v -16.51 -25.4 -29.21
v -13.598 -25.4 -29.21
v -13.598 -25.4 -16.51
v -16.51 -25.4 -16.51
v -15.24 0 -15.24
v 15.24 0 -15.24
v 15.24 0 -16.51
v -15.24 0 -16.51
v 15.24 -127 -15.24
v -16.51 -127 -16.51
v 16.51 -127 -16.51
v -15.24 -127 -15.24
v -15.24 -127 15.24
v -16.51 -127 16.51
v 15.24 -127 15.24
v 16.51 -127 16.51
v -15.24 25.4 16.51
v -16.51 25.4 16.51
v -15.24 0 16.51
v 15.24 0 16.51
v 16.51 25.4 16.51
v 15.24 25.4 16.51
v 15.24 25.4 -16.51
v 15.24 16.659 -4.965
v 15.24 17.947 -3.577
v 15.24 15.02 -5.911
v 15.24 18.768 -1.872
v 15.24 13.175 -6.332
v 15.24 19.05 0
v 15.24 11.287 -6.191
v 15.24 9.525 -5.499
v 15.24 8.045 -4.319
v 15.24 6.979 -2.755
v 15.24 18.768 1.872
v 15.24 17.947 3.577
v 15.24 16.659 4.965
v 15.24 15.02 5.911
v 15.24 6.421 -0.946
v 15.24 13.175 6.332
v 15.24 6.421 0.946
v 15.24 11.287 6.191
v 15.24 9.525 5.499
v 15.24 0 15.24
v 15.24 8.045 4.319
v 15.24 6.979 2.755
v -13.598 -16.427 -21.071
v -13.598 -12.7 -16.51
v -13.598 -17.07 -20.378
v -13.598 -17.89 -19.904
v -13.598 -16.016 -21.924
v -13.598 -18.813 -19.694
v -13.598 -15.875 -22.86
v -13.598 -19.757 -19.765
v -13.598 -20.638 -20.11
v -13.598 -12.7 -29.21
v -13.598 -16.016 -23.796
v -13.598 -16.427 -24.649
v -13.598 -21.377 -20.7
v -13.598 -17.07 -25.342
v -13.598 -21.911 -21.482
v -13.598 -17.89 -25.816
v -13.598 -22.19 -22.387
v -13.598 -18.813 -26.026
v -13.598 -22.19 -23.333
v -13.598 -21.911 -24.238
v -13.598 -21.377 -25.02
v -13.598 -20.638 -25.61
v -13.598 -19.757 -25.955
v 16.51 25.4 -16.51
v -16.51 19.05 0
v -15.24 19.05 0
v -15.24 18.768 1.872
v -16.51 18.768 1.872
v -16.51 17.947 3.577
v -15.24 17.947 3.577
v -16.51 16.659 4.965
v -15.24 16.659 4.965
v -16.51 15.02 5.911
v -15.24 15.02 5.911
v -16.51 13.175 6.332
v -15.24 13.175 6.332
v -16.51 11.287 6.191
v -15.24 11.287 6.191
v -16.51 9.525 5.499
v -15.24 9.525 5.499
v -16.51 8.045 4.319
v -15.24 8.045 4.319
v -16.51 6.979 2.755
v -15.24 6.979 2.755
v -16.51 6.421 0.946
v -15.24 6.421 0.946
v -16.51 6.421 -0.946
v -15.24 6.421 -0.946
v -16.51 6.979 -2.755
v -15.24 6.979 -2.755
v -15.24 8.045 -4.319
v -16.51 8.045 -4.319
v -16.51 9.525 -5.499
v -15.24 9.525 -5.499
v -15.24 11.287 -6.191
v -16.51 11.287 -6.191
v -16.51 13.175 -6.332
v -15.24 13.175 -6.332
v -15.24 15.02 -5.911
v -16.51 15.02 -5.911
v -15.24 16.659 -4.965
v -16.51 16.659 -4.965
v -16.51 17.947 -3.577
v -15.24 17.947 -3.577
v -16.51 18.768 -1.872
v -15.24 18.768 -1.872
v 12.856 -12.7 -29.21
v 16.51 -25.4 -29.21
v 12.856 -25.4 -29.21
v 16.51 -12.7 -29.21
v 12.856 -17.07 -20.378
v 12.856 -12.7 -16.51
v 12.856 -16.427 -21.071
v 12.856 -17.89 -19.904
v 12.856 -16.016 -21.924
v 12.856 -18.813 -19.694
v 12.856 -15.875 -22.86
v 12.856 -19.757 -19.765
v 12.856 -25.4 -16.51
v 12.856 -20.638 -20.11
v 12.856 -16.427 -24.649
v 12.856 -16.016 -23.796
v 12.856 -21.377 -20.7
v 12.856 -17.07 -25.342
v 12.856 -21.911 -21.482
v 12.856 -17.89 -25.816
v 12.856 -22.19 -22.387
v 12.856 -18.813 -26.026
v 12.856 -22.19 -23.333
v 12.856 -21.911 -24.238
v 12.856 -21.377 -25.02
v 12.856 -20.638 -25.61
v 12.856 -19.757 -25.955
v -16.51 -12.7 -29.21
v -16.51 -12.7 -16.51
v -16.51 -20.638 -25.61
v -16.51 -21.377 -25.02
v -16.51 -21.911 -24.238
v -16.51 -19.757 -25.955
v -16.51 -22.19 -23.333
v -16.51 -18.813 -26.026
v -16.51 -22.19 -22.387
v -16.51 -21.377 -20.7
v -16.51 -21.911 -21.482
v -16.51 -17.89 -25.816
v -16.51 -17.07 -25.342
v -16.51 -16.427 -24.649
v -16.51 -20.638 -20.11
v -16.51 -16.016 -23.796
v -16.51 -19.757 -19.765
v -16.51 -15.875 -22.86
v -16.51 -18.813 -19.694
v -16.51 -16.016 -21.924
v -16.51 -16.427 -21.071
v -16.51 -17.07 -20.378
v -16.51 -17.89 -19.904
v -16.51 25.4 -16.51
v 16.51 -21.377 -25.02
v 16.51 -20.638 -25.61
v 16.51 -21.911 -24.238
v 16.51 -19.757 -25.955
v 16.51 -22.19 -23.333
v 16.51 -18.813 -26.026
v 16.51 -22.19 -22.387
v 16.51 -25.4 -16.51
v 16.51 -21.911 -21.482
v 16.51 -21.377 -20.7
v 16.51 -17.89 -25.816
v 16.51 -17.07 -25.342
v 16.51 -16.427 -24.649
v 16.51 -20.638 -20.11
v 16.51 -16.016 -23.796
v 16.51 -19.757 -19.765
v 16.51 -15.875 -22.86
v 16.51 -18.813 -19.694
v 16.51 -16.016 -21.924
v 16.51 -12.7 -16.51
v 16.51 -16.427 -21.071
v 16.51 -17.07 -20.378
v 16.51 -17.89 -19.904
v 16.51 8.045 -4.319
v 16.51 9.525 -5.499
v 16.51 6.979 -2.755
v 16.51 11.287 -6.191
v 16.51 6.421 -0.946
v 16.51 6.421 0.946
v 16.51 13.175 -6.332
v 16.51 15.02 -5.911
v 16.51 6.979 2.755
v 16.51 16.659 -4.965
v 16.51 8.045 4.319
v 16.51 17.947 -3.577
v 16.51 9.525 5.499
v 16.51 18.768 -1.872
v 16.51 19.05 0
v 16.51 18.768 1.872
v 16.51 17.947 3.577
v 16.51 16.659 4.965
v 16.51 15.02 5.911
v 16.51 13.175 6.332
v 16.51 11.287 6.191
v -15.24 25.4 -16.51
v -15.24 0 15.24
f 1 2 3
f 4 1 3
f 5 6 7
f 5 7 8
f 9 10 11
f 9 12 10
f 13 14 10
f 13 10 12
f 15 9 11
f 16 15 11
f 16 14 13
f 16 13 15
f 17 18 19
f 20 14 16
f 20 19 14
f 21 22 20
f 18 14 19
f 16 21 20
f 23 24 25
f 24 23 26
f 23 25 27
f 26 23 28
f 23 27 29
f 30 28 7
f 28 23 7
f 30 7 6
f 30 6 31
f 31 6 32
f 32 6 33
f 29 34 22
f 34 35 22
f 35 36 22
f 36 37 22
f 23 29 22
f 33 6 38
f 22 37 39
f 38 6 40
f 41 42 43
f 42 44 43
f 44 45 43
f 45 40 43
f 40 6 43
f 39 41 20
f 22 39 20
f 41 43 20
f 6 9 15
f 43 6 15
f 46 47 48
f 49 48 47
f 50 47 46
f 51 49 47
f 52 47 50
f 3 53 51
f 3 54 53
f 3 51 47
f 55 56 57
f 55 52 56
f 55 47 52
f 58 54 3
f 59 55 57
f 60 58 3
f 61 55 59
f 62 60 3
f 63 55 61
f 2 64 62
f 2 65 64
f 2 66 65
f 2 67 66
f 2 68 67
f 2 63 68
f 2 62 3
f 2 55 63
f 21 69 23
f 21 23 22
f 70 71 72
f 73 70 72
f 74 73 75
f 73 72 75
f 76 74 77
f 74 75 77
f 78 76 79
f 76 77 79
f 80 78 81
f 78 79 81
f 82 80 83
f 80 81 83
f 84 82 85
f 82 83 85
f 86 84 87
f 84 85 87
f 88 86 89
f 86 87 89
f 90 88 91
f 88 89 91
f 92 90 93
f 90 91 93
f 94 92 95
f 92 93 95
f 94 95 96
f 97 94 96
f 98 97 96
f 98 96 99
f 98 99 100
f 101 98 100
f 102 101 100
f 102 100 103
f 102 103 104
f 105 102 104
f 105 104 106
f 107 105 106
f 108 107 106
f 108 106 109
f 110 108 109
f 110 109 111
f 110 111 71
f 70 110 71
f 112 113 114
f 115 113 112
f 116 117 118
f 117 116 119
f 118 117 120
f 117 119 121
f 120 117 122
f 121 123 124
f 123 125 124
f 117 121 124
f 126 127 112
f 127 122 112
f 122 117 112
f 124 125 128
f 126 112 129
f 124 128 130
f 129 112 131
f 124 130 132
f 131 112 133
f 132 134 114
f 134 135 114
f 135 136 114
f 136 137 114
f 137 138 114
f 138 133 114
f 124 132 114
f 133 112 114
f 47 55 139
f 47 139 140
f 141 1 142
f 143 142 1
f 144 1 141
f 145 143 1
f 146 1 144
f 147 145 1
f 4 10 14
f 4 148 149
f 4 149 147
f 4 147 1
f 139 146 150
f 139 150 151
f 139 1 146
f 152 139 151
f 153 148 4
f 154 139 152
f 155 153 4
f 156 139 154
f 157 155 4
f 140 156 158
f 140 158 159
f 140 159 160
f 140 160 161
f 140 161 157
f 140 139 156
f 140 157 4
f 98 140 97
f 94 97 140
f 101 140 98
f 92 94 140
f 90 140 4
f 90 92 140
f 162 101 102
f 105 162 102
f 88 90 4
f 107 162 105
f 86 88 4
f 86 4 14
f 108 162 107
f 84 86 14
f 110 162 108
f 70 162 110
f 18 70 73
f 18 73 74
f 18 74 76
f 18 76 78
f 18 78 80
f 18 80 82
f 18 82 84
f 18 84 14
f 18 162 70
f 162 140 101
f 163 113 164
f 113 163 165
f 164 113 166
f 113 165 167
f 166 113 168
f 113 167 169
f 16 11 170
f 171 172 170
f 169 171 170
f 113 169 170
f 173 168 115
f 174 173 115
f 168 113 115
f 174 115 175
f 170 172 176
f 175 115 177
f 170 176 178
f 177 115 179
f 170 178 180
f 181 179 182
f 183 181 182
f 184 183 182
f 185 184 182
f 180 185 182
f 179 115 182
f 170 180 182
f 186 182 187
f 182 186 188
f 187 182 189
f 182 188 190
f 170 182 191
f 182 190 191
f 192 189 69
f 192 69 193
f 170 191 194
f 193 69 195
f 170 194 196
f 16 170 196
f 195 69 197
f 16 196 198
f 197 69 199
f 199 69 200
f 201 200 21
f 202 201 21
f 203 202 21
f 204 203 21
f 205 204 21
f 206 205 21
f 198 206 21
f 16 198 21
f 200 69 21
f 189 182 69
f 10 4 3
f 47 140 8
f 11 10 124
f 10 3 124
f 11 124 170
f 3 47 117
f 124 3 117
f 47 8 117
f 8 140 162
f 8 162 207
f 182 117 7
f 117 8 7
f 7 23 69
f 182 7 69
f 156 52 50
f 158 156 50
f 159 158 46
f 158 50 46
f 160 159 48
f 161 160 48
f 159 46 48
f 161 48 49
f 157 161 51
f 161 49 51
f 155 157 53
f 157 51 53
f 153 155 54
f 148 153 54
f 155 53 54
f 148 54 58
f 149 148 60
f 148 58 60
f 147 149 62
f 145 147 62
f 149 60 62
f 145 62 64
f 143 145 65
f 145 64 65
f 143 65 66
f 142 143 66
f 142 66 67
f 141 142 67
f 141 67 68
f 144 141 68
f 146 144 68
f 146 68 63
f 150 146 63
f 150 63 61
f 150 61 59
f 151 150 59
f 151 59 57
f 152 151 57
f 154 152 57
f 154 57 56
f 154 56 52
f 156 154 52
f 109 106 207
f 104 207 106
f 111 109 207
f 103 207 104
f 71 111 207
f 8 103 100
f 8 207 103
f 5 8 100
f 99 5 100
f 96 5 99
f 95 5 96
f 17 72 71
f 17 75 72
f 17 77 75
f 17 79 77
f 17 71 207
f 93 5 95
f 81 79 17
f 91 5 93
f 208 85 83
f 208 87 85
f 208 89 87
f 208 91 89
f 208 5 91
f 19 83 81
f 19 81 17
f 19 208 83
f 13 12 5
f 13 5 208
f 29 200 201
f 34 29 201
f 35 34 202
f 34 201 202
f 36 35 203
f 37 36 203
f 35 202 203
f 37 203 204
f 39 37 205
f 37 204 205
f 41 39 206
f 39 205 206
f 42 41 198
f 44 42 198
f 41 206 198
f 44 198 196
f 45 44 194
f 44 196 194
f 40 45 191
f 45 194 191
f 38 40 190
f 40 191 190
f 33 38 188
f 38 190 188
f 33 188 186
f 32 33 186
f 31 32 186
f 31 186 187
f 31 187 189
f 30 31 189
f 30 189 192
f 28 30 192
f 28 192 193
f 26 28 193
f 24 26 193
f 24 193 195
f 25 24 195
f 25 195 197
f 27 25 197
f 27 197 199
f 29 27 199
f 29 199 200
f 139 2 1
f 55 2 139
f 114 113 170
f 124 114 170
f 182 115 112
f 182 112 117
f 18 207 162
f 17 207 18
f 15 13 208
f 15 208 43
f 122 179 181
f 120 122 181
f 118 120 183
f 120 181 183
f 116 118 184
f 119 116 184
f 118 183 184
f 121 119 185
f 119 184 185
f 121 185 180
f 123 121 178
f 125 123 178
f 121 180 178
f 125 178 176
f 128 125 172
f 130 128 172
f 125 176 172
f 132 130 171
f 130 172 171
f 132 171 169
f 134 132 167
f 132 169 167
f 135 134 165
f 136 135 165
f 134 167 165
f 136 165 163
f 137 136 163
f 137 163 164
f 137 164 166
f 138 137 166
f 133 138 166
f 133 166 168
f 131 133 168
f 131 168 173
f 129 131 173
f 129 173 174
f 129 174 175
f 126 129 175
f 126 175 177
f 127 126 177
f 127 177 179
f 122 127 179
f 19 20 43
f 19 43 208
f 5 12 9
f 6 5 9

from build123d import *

# Parameters (mm, degrees)
F0_W      = 33.02
F0_H      = 33.02
F1_DEPTH  = 127
F2_W      = 30.48
F2_H      = 30.48
F3_DEPTH  = 127
F4_W      = 25.4
F4_H      = 33.02
F4_R      = 6.35
F5_DEPTH  = 33.02
F6_W      = 30.48
F6_H      = 33.02
F7_DEPTH  = 25.4
F8_W      = 12.7
F8_H      = 12.7
F8_R      = 3.175
F9_DEPTH  = 33.02
F10_W     = 26.4536738396
F10_H     = 12.7
F11_DEPTH = 12.7


with BuildPart() as f1:
    # F0 (on Front) → F1 (new body)
    with BuildSketch(Plane.XZ):
        Rectangle(F0_W, F0_H)
    extrude(amount=F1_DEPTH)

    # F2 (on face) → F3 (cut)
    with BuildSketch(Plane.XZ.offset(127)):
        Rectangle(F2_W, F2_H)
    extrude(amount=-F3_DEPTH, mode=Mode.SUBTRACT)

    # F4 (on face) → F5 (join)
    with BuildSketch(Plane.YZ.offset(16.51)):
        with Locations((12.7, 0)):
            Rectangle(F4_W, F4_H)
        with Locations((12.7, 0)):
            Circle(F4_R, mode=Mode.SUBTRACT)
    extrude(amount=-F5_DEPTH)

    # F6 (on face) → F7 (cut)
    with BuildSketch(Plane(origin=(0, 25.4, 0), x_dir=(-1, 0, 0), z_dir=(0, 1, 0))):
        Rectangle(F6_W, F6_H)
    extrude(amount=-F7_DEPTH, mode=Mode.SUBTRACT)

    # F8 (on face) → F9 (join)
    with BuildSketch(Plane.YZ.offset(16.51)):
        with Locations((-19.05, -22.86)):
            Rectangle(F8_W, F8_H)
        with Locations((-19.05, -22.86)):
            Circle(F8_R, mode=Mode.SUBTRACT)
    extrude(amount=-F9_DEPTH)

    # F10 (on face) → F11 (cut)
    with BuildSketch(Plane(origin=(0, 0, -29.21), x_dir=(1, 0, 0), z_dir=(0, 0, -1))):
        with Locations((-0.37084613, 19.05)):
            Rectangle(F10_W, F10_H)
    extrude(amount=-F11_DEPTH, mode=Mode.SUBTRACT)


solid = f1.part
